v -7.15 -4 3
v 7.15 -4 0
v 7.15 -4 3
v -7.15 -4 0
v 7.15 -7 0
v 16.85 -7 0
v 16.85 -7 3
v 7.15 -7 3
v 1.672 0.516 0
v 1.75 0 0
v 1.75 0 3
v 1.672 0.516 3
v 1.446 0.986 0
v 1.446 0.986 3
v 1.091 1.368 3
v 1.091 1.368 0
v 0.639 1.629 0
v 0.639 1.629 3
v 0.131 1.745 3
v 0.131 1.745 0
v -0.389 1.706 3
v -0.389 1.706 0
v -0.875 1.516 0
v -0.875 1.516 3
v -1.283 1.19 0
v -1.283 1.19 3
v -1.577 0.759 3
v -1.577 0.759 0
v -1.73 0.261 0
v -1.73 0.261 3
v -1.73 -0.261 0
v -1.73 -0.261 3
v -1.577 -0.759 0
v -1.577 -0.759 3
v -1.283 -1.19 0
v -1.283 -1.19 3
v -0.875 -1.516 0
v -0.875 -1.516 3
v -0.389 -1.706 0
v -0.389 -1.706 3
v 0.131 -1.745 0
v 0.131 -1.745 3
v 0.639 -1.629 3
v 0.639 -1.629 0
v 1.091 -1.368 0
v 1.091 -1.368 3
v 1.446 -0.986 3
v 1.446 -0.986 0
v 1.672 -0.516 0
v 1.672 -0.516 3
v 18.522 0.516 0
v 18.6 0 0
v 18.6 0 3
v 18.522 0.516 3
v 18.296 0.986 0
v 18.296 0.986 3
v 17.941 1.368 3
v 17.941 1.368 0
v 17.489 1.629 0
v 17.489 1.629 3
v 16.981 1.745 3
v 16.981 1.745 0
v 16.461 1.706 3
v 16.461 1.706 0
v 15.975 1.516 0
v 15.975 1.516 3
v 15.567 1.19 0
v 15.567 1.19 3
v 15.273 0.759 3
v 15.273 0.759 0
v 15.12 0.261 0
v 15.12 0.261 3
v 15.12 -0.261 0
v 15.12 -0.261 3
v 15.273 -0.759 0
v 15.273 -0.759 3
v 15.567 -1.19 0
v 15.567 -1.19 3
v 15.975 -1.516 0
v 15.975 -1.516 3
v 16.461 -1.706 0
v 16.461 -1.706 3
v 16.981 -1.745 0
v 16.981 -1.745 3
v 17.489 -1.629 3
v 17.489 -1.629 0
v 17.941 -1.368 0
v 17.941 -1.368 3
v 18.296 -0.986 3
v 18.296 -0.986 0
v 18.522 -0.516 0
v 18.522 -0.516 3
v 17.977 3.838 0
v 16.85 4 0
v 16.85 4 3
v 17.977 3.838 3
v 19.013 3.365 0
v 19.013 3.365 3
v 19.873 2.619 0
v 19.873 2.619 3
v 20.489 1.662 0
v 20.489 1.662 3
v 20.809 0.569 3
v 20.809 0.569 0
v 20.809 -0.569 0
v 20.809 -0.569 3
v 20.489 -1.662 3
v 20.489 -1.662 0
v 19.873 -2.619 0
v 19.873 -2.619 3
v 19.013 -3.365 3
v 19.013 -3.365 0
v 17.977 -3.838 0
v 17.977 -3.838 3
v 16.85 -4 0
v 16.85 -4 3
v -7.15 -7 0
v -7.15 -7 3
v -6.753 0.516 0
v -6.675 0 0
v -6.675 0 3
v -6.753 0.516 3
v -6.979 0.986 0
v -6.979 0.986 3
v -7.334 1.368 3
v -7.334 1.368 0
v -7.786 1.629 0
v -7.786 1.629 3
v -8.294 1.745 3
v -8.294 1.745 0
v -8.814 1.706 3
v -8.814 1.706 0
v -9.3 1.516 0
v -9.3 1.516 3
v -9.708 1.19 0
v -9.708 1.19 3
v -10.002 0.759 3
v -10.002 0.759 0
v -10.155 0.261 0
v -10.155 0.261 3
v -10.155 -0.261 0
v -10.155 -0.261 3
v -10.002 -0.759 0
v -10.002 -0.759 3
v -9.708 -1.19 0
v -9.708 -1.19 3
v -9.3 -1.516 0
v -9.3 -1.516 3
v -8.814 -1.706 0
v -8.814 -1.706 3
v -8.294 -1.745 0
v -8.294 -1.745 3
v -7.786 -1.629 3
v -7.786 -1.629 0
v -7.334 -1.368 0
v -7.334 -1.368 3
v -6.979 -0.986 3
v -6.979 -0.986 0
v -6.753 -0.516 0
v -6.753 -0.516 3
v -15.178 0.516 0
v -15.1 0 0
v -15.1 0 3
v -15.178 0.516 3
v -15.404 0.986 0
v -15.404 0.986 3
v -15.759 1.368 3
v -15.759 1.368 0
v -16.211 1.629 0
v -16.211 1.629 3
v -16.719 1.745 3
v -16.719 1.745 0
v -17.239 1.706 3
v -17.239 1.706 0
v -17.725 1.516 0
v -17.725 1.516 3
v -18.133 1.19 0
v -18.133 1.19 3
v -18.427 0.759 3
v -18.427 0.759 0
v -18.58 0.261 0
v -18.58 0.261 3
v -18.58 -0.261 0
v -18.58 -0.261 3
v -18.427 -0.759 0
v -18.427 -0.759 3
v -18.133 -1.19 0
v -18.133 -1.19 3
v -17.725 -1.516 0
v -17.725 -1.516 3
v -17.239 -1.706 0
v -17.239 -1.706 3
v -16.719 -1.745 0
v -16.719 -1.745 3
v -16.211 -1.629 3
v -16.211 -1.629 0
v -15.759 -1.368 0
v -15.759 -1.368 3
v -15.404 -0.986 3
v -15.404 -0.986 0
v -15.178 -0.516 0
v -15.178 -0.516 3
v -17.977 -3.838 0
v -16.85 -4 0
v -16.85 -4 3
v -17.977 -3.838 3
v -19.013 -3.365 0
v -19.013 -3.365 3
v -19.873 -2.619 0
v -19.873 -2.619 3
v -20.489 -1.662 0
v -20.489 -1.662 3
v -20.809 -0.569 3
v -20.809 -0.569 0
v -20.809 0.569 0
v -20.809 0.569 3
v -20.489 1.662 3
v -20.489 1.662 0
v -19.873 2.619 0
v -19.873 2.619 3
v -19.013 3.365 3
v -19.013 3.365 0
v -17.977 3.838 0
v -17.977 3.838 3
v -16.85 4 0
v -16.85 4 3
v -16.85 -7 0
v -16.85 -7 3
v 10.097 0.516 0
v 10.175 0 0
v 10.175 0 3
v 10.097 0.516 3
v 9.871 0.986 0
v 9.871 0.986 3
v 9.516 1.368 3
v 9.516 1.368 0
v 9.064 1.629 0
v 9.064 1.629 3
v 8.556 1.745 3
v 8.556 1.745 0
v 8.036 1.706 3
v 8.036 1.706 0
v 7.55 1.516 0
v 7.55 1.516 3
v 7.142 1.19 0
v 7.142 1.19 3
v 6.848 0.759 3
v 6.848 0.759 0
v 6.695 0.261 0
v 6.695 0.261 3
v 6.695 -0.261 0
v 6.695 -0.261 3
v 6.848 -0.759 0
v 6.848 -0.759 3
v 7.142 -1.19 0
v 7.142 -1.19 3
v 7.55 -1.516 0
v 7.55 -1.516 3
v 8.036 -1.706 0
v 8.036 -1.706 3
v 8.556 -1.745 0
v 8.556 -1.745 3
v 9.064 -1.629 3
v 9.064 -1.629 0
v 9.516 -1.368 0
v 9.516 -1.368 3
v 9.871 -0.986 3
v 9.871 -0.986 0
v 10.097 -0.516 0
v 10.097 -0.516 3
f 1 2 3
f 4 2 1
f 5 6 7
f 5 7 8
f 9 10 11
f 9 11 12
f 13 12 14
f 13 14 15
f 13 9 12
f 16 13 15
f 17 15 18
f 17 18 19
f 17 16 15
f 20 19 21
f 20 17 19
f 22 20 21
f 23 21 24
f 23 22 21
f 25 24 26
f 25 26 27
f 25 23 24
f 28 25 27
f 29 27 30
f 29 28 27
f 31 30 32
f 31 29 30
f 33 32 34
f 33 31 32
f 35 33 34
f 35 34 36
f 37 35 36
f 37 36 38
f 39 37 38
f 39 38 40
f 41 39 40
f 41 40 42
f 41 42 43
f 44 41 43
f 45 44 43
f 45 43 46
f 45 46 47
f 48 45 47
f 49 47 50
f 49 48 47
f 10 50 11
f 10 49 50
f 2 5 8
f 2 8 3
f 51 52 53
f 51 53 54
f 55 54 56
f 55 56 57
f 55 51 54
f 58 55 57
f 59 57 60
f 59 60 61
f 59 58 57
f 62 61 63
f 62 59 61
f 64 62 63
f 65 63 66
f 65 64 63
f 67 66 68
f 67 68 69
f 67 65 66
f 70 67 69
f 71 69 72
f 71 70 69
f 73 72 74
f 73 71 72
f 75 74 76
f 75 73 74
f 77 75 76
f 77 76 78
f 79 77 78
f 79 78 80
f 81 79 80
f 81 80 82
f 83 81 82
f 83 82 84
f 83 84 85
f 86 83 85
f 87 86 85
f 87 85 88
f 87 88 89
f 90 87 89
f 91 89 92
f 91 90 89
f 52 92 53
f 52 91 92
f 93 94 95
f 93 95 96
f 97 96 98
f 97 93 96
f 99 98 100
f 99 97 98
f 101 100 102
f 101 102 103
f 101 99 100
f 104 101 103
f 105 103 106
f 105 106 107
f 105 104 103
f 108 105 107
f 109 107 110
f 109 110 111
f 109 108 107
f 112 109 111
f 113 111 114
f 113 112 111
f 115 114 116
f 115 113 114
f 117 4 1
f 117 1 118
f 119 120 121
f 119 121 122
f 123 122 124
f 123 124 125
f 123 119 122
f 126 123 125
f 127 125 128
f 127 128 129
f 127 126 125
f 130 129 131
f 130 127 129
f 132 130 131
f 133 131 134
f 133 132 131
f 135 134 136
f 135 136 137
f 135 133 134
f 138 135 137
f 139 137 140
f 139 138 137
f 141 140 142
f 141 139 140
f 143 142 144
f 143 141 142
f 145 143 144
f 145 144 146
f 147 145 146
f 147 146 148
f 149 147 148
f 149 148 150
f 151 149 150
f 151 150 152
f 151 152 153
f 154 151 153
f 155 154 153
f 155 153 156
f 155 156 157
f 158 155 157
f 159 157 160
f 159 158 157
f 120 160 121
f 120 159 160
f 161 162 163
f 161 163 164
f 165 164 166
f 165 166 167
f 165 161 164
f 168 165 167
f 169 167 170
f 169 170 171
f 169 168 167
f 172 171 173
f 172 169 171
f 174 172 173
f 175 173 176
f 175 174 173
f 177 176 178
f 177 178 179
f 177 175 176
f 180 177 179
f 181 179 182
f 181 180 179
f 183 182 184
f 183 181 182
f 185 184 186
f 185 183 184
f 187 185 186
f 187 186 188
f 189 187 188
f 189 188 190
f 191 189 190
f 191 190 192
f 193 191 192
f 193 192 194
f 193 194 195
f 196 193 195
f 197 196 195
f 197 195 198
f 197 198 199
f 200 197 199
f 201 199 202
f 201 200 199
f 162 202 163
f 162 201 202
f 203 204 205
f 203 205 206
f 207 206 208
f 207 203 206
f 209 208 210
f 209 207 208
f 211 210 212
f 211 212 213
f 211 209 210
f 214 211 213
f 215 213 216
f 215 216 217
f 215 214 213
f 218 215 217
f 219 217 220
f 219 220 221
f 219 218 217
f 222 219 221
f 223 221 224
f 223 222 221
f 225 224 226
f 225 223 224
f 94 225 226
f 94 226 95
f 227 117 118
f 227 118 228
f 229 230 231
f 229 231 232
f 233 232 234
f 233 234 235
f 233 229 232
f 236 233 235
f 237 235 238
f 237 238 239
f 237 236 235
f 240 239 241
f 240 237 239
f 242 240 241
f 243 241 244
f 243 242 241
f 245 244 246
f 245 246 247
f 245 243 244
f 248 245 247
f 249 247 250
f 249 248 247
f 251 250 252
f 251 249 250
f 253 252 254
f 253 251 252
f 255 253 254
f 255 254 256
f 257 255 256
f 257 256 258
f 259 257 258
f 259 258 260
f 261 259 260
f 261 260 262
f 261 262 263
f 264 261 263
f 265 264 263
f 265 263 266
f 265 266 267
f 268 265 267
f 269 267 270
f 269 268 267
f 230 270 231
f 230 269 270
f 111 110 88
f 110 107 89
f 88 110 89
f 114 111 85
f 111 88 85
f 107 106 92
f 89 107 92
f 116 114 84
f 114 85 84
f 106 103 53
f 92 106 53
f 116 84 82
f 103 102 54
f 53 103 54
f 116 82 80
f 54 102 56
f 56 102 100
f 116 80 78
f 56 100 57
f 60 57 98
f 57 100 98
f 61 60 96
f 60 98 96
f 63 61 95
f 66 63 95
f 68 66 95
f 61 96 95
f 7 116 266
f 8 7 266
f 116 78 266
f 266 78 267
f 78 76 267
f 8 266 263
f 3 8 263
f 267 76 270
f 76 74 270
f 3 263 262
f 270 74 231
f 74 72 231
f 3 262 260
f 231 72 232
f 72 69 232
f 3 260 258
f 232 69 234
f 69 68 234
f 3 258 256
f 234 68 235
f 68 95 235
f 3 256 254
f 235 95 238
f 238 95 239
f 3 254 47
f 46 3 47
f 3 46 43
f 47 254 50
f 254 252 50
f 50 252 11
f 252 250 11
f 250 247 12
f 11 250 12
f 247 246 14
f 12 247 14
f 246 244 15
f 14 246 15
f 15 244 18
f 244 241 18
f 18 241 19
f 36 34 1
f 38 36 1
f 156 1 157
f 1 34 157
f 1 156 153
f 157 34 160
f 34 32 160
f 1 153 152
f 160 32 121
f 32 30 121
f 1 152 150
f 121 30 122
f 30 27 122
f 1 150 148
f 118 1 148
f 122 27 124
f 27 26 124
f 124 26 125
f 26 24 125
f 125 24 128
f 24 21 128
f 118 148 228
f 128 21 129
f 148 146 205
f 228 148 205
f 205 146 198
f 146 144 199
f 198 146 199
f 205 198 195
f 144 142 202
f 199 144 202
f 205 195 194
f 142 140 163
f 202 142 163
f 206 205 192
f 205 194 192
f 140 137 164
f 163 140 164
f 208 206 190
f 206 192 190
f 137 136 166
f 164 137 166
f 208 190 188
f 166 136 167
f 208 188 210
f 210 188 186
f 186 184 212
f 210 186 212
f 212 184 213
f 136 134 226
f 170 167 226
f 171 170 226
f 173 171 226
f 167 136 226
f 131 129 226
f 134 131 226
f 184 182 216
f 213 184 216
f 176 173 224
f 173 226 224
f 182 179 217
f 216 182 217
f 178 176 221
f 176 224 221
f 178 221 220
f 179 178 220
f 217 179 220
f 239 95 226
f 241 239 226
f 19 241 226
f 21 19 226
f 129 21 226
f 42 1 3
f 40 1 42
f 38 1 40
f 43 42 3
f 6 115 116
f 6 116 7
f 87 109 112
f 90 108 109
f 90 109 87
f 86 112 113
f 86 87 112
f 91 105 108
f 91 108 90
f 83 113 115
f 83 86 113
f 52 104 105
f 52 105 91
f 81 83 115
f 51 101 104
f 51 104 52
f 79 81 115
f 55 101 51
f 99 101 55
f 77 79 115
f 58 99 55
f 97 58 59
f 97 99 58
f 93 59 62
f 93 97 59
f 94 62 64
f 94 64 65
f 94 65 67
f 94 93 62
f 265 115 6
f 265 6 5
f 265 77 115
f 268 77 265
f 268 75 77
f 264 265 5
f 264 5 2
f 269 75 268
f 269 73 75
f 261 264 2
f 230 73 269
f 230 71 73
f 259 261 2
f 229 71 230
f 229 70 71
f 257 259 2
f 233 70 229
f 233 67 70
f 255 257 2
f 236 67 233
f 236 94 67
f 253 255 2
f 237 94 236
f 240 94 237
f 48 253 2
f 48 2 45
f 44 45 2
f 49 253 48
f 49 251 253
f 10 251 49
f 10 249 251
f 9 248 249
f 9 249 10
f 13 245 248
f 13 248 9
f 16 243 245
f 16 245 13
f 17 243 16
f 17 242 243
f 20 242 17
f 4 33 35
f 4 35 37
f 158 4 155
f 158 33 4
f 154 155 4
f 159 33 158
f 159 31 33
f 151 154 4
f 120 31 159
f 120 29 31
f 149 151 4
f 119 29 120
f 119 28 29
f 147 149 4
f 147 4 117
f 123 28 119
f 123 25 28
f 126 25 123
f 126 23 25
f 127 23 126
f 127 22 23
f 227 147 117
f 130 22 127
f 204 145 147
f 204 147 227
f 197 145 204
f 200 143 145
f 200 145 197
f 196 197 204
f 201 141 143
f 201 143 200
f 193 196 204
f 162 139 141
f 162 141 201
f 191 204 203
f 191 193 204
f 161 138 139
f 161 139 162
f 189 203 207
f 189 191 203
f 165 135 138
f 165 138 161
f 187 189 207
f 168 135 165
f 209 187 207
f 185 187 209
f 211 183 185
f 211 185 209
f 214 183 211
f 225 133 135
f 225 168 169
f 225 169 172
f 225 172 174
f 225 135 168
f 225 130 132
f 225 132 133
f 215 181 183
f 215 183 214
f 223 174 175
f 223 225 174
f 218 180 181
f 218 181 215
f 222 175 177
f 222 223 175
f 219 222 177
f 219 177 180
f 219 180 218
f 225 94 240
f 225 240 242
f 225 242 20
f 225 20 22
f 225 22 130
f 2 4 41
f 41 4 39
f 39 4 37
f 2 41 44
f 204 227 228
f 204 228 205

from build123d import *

# Parameters (mm, degrees)
SKETCH1_R           = 1.75
BOSS_EXTRUDE1_DEPTH = 3


with BuildPart() as part:
    # Sketch1 → Boss-Extrude1 (new body)
    with BuildSketch(Plane.XY):
        with BuildLine():
            Line((-16.85, 4), (16.85, 4))
            ThreePointArc((16.85, 4), (20.85, 0), (16.85, -4))
            Line((16.85, -4), (16.85, -7))
            Line((16.85, -7), (7.15, -7))
            Line((7.15, -7), (7.15, -4))
            Line((7.15, -4), (-7.15, -4))
            Line((-7.15, -4), (-7.15, -7))
            Line((-7.15, -7), (-16.85, -7))
            Line((-16.85, -7), (-16.85, -4))
            ThreePointArc((-16.85, -4), (-20.85, 0), (-16.85, 4))
        make_face()
        with Locations((-16.85, 0)):
            Circle(SKETCH1_R, mode=Mode.SUBTRACT)
        with Locations((-8.425, 0)):
            Circle(SKETCH1_R, mode=Mode.SUBTRACT)
        Circle(SKETCH1_R, mode=Mode.SUBTRACT)
        with Locations((8.425, 0)):
            Circle(SKETCH1_R, mode=Mode.SUBTRACT)
        with Locations((16.85, 0)):
            Circle(SKETCH1_R, mode=Mode.SUBTRACT)
    extrude(amount=BOSS_EXTRUDE1_DEPTH)


solid = part.part
